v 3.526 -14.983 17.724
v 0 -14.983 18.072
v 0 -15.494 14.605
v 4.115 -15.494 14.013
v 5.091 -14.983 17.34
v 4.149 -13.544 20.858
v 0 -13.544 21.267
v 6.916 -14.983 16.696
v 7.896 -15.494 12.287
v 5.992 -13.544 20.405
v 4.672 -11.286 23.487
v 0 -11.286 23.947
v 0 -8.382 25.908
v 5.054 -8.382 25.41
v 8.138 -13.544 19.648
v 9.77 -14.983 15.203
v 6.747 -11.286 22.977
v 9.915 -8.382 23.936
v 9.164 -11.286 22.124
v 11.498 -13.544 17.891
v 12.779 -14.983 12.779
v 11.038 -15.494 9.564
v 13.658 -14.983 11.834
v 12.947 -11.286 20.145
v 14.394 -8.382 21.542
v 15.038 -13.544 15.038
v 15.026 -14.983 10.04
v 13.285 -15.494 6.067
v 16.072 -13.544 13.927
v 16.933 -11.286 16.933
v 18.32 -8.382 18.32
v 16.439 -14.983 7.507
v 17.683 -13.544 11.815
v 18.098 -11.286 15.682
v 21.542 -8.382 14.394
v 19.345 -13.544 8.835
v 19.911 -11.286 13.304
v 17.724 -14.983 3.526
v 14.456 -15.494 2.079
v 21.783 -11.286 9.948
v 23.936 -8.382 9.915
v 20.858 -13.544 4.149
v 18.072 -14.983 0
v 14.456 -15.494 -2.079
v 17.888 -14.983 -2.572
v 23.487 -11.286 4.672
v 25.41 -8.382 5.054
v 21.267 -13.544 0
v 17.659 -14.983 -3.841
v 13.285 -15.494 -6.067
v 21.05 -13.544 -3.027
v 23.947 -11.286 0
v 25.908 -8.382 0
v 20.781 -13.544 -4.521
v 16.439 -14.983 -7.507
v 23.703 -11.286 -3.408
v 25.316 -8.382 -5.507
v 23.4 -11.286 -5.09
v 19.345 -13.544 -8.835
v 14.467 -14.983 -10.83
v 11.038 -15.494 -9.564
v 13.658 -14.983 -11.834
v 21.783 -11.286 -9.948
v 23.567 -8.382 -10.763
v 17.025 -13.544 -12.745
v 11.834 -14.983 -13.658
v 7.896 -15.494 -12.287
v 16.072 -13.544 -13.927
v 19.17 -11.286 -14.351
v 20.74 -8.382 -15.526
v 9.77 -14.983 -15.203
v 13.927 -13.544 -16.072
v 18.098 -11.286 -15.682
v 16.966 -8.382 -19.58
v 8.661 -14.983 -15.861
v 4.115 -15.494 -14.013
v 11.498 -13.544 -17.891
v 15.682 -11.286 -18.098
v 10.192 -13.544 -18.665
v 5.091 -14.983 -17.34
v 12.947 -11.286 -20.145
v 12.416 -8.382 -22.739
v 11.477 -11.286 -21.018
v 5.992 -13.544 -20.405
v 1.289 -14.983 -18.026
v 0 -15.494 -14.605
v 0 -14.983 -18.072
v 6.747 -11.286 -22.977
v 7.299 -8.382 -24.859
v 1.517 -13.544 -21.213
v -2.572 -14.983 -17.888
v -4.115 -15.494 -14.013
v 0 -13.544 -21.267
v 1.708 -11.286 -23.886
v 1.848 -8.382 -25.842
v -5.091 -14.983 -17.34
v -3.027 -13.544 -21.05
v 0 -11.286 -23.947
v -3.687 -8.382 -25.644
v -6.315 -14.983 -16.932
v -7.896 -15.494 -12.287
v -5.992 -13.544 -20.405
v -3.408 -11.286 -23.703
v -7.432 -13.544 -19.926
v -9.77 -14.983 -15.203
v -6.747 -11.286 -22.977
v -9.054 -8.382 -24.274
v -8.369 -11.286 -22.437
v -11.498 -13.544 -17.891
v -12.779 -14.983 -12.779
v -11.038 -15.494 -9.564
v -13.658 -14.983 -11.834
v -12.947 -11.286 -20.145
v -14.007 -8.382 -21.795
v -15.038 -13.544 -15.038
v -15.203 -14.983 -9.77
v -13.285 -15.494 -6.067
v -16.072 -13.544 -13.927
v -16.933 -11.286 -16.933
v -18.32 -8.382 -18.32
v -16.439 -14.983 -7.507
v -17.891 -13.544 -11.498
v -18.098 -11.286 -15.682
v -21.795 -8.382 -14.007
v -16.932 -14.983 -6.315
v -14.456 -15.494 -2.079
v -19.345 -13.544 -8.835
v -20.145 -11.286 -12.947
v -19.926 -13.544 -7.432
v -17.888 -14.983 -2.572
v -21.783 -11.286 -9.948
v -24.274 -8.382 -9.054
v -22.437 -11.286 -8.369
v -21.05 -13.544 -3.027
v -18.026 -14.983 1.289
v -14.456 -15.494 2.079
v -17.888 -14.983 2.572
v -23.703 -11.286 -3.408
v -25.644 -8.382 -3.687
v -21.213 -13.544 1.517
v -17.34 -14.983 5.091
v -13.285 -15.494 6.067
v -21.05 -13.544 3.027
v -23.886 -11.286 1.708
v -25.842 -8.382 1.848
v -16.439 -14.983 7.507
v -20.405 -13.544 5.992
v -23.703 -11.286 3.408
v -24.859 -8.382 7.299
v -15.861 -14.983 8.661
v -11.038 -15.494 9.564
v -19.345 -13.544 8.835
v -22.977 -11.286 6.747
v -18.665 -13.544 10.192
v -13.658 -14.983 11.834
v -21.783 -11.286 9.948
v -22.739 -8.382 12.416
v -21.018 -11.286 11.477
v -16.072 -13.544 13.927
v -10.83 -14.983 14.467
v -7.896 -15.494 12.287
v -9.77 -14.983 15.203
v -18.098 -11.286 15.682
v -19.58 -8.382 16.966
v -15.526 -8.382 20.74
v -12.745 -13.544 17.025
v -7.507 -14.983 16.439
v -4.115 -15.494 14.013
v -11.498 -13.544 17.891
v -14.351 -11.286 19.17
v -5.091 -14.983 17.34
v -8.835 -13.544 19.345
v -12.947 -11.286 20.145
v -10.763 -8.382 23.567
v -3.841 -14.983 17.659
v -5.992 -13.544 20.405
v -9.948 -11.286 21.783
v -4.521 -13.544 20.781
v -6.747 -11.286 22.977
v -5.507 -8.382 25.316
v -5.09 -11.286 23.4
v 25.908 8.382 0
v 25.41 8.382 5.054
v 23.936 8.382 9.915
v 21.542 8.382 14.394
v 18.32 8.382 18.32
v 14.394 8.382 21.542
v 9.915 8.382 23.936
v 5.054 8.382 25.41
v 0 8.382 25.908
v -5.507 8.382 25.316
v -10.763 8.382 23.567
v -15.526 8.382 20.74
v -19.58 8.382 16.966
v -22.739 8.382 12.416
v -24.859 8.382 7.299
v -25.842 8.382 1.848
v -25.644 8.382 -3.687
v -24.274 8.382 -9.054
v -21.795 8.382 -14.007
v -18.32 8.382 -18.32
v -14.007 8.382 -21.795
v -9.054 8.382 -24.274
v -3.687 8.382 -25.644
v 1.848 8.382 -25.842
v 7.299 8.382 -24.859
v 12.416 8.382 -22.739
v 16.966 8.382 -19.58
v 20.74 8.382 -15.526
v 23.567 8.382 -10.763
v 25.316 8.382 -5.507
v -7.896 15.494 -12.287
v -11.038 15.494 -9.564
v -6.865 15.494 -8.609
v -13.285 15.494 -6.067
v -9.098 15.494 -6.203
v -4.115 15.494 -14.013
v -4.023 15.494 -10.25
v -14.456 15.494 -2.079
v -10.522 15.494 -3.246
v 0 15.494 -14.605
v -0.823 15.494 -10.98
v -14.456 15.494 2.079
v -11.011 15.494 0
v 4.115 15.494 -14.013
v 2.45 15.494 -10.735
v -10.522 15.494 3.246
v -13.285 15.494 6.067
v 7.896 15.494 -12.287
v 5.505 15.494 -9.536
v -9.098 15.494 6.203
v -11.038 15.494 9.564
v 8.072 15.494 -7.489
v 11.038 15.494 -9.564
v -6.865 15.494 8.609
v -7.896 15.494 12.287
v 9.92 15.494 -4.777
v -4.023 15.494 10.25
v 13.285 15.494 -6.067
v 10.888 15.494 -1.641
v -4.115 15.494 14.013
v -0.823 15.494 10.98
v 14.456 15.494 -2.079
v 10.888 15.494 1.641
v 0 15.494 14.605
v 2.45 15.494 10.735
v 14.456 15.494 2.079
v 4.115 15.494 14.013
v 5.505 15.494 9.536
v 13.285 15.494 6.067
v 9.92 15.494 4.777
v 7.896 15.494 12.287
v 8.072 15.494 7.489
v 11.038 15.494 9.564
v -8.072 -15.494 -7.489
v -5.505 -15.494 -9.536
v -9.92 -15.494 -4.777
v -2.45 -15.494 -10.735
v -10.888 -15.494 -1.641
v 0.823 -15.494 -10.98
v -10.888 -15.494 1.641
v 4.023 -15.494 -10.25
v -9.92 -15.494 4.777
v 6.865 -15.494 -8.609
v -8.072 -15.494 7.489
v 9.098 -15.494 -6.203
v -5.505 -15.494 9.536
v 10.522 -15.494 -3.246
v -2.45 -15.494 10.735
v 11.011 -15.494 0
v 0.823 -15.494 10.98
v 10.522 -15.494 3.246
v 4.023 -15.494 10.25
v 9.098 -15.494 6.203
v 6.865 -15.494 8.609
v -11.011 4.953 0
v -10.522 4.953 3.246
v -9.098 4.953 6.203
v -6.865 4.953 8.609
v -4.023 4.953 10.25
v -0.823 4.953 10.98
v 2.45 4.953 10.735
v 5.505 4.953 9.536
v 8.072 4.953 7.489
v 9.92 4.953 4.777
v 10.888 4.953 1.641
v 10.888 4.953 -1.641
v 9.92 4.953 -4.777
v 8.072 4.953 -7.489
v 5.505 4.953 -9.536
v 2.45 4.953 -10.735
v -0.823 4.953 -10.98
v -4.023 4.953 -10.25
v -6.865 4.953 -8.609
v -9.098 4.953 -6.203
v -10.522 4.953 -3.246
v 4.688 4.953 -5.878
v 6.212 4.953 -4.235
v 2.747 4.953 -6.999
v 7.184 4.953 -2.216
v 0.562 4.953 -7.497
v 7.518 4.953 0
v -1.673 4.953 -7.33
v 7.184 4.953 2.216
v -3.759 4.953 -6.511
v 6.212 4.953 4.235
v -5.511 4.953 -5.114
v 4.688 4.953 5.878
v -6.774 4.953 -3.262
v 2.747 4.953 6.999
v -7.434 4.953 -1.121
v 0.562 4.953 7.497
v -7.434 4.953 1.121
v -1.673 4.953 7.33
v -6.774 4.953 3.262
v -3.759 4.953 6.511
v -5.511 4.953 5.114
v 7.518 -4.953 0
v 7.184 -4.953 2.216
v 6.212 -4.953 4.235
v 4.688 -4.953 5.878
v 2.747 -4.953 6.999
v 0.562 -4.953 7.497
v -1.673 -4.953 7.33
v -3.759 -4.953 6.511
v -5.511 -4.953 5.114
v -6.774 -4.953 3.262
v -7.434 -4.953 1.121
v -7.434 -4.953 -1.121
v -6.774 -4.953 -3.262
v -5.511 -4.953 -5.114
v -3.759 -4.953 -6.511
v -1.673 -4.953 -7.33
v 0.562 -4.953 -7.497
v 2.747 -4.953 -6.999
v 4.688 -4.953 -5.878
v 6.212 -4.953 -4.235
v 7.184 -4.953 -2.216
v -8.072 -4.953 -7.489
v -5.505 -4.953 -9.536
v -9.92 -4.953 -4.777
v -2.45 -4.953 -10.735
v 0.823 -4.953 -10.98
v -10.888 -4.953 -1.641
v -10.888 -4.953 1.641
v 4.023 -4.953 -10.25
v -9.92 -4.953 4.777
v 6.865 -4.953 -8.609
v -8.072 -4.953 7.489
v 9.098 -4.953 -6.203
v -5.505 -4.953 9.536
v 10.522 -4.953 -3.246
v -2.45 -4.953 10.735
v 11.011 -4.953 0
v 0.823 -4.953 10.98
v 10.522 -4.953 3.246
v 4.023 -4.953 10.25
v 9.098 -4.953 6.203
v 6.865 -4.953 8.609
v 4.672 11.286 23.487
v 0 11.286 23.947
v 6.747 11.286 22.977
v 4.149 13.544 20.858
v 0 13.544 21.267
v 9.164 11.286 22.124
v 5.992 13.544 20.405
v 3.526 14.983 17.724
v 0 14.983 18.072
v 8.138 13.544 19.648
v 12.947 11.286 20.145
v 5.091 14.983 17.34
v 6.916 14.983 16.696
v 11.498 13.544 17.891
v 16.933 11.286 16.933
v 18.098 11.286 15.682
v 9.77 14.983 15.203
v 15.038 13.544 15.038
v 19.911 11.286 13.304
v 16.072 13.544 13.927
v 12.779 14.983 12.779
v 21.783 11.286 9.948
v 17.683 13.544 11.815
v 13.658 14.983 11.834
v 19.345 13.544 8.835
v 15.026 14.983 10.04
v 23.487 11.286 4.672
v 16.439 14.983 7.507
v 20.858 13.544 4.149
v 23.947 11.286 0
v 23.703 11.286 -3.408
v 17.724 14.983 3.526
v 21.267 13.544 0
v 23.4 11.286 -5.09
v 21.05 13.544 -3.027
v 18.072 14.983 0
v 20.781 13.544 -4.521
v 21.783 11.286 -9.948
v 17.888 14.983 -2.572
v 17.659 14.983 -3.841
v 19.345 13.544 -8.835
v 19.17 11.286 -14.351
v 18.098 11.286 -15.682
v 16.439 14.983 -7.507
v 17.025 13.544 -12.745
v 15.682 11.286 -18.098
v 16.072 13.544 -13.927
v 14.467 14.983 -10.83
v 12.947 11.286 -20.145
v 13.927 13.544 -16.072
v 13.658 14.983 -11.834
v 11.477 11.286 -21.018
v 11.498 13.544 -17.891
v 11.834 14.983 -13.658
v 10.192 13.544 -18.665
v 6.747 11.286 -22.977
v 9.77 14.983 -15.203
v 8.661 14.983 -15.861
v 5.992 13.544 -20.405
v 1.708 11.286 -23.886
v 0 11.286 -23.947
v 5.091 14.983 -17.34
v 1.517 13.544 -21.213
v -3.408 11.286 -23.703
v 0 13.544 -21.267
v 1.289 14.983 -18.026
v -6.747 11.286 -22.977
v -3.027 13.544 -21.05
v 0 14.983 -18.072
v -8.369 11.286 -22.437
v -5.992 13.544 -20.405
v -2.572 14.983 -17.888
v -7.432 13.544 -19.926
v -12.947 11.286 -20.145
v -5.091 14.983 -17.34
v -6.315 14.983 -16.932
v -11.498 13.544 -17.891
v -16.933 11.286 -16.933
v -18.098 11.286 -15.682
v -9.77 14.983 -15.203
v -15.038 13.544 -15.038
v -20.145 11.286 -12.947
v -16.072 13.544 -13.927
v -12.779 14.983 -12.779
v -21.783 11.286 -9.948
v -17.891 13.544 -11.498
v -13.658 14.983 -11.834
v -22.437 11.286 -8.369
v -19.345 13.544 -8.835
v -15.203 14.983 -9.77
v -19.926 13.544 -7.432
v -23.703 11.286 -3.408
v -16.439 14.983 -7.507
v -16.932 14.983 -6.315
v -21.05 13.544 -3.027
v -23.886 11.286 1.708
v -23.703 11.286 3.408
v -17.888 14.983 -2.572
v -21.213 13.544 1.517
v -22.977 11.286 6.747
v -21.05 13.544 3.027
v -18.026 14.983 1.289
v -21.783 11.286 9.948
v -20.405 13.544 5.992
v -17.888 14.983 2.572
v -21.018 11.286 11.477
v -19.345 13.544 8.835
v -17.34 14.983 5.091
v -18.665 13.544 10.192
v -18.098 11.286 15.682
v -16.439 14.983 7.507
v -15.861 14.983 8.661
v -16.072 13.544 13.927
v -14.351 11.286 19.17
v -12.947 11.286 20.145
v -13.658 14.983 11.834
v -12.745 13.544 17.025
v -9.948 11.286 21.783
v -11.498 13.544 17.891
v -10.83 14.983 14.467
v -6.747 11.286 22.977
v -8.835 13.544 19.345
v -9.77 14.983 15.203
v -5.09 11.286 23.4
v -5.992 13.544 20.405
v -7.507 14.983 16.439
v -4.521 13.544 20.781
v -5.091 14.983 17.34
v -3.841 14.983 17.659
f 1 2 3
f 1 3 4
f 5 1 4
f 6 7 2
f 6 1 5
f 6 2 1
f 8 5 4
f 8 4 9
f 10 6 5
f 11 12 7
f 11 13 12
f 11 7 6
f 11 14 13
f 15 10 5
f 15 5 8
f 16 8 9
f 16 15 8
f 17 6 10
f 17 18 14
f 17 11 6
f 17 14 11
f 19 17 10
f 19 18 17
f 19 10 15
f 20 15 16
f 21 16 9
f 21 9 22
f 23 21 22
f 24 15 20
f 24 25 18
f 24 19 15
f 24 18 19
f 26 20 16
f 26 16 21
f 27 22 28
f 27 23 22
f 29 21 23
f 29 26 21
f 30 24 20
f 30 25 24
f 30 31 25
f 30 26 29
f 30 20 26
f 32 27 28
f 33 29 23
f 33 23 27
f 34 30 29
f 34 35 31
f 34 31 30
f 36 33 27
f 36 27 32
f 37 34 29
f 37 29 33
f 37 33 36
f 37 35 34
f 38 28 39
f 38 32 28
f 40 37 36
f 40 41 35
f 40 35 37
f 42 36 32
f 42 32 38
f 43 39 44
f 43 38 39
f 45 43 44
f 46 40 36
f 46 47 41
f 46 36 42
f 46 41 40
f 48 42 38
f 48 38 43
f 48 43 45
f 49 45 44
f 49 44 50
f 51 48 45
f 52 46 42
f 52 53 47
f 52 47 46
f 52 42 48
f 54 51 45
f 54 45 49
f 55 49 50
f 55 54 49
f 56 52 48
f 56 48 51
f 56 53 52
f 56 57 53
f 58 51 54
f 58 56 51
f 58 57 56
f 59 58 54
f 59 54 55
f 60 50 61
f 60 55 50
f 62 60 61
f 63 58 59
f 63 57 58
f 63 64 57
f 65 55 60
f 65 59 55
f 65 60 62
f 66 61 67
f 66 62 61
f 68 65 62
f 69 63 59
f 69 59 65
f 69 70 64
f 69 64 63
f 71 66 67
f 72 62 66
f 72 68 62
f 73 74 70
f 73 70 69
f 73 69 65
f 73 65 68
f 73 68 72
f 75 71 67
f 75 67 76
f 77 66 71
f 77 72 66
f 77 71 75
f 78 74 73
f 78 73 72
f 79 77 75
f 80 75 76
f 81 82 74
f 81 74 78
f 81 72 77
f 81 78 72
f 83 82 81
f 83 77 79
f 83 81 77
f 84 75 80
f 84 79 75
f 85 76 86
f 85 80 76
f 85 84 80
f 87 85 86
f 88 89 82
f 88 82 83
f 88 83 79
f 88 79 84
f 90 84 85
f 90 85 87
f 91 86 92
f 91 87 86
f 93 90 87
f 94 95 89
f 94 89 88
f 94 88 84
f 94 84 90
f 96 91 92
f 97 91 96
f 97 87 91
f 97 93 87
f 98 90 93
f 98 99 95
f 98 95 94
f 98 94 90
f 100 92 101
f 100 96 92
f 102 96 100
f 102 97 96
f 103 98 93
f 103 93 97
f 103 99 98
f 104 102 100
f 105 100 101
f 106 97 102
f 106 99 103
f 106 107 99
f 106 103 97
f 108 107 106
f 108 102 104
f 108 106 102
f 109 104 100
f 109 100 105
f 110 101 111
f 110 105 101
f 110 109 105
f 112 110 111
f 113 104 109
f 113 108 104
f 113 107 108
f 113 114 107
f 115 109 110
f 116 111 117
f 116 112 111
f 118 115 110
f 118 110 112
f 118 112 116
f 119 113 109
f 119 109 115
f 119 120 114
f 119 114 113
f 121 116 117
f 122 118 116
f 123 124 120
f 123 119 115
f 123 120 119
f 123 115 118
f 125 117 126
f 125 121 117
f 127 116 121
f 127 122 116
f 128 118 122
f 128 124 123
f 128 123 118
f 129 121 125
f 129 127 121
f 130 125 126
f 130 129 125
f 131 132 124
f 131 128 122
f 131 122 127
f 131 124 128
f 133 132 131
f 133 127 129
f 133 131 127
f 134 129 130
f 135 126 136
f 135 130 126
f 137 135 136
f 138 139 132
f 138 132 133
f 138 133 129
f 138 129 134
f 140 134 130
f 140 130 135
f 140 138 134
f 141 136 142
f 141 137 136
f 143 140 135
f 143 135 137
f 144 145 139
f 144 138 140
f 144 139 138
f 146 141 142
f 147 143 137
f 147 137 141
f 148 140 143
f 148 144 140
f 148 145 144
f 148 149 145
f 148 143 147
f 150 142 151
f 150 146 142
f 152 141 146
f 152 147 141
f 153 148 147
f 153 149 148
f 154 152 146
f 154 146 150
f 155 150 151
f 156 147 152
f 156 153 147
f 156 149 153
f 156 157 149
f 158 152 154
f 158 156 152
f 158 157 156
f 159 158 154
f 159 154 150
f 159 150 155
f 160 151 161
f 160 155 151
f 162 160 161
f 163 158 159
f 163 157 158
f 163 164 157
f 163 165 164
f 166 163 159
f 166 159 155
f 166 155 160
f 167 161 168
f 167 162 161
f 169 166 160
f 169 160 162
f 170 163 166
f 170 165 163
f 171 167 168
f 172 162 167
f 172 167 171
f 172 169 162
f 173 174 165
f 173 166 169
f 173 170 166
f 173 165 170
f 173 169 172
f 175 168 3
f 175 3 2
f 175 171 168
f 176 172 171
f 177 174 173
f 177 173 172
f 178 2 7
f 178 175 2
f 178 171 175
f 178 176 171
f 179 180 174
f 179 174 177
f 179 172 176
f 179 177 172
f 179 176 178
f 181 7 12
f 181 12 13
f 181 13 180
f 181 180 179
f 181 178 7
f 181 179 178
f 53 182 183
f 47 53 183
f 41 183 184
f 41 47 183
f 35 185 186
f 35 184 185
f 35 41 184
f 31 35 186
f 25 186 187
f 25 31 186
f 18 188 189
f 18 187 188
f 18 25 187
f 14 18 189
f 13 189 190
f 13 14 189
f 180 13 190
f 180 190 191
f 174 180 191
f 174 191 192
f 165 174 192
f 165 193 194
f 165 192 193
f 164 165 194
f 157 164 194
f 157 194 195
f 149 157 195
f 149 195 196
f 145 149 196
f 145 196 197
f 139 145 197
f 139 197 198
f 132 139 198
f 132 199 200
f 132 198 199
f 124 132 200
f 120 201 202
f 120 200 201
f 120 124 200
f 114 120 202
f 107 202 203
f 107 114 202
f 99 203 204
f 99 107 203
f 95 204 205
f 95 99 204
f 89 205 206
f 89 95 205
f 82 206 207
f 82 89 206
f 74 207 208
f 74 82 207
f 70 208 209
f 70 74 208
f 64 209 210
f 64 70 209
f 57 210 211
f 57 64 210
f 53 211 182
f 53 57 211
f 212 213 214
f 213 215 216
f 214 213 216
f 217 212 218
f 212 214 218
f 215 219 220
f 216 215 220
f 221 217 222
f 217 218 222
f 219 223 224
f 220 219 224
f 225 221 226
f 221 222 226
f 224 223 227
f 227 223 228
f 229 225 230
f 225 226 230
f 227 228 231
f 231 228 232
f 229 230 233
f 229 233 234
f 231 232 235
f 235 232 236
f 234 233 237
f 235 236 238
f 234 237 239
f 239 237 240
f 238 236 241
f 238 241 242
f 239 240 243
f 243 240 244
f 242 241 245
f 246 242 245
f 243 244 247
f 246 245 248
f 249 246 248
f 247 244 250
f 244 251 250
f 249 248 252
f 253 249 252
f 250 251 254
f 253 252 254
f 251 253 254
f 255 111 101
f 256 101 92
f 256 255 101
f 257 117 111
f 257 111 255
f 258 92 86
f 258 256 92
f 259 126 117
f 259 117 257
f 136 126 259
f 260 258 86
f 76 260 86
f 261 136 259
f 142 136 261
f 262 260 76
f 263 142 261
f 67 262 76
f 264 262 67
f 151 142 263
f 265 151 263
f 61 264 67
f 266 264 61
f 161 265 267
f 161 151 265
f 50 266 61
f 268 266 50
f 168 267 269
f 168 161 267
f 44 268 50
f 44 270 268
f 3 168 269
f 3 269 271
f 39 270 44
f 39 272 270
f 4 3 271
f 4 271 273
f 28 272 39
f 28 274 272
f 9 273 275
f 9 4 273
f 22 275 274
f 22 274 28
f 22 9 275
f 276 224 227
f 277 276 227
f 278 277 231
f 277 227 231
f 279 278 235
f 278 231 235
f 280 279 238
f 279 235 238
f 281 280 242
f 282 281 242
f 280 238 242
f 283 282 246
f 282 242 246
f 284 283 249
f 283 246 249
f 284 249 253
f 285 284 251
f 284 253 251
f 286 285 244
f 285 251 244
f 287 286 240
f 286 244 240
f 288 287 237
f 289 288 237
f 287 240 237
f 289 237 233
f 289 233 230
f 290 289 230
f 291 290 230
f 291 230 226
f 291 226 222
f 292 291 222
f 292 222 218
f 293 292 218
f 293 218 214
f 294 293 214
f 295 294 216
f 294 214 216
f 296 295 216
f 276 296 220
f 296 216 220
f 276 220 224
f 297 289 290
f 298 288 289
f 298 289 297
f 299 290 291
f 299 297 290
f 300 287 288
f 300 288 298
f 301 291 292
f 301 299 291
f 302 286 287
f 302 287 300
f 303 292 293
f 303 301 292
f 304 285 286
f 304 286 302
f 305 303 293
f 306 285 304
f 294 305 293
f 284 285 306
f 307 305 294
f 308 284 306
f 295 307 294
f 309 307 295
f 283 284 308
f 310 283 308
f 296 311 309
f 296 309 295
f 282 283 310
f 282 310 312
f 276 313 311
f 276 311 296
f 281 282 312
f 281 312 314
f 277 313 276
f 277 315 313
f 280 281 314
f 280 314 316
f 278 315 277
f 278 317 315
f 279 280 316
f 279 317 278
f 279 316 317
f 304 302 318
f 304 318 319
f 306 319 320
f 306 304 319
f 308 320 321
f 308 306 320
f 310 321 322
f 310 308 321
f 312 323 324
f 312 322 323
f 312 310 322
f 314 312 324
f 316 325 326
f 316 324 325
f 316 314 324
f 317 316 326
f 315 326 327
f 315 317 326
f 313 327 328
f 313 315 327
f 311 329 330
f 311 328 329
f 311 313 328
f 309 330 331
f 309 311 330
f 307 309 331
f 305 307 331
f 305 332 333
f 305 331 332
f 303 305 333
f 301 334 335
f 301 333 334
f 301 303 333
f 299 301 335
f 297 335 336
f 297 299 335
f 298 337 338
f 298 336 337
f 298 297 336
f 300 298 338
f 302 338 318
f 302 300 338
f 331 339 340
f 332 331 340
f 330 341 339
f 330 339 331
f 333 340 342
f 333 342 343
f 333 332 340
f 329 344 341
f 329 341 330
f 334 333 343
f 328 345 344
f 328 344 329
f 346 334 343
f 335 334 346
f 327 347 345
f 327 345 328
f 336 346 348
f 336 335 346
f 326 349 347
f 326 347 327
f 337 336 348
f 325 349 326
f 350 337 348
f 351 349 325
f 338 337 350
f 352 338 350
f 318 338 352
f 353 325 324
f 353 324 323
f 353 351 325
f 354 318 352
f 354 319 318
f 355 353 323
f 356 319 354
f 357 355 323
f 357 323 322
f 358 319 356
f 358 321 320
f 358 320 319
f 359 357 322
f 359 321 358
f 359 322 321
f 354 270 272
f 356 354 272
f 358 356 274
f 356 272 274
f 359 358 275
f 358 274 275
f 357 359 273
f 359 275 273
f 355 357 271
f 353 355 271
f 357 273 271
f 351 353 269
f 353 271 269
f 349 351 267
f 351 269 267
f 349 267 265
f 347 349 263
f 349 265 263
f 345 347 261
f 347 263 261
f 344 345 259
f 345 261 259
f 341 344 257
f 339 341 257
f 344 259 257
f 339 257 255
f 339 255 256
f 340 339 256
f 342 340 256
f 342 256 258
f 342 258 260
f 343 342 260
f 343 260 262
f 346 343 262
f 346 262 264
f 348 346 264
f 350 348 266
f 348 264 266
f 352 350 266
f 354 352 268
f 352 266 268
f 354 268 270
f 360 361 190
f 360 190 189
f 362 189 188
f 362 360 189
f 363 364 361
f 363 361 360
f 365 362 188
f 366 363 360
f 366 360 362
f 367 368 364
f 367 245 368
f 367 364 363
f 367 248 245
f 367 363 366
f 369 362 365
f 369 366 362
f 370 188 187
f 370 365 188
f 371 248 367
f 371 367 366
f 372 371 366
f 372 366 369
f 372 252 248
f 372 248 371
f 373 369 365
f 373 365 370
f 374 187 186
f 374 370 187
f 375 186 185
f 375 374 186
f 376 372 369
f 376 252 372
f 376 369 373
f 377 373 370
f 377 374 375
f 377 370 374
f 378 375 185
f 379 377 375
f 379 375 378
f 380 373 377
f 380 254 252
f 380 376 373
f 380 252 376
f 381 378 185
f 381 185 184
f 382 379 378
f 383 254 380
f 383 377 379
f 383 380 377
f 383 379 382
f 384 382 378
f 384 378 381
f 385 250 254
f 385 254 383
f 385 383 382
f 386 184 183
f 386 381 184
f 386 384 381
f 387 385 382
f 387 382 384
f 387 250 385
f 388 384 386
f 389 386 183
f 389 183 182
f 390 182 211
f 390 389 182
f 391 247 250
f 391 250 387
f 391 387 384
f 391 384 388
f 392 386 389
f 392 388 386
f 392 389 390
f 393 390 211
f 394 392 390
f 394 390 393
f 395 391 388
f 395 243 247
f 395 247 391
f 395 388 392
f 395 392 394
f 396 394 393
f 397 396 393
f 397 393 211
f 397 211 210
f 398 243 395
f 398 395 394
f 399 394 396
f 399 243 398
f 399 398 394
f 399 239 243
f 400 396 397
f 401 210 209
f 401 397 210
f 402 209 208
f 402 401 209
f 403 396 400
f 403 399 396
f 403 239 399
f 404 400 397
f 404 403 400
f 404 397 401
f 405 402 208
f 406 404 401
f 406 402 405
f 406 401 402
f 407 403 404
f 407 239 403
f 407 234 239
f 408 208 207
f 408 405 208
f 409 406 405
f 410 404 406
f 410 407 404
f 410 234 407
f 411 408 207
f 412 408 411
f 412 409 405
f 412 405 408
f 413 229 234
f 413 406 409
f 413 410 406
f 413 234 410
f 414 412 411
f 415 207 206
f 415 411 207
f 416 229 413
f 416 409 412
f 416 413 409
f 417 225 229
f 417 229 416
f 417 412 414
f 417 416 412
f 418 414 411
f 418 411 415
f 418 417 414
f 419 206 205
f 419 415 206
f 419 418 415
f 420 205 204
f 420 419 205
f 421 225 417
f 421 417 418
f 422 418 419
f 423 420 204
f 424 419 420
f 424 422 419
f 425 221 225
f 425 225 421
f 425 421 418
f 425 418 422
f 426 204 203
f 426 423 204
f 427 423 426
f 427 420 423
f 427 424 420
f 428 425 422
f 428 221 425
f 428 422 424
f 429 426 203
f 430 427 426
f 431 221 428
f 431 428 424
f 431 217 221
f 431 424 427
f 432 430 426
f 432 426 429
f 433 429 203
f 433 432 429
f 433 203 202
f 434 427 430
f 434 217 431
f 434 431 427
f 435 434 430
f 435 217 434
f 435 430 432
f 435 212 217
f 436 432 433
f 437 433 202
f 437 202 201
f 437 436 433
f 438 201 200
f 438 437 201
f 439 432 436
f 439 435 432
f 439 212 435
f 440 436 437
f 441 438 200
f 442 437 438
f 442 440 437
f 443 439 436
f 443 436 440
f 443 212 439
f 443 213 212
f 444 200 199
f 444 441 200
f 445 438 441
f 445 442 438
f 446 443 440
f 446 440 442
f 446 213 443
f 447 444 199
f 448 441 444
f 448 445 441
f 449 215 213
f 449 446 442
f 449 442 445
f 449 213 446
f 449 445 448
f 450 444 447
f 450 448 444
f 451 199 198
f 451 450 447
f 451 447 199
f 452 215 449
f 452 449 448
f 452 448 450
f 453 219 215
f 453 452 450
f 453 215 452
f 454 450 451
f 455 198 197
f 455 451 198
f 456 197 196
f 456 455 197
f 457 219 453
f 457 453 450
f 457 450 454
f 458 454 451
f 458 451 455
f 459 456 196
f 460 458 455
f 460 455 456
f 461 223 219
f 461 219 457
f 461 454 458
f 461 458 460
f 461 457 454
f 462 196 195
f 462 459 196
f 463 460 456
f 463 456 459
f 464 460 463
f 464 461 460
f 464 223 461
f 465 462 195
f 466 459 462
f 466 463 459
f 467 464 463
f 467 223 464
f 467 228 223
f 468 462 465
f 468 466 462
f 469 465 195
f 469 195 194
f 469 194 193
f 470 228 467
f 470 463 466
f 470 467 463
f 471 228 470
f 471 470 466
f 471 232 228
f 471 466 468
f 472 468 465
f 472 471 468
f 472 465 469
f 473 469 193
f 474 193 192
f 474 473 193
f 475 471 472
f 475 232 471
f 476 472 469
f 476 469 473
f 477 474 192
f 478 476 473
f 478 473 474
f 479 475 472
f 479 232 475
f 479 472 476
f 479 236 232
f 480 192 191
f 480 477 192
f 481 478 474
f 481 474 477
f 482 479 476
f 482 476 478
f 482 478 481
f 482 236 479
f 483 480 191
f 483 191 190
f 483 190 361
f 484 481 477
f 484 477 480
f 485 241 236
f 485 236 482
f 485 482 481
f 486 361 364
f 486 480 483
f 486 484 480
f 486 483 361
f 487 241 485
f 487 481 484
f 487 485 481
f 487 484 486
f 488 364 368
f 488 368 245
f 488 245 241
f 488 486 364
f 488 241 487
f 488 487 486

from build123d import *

# Parameters (mm, degrees)
F0_R     = 25.908
F0_R_2   = 7.5184
F1_DEPTH = 15.494
F2_R     = 11.0109
F3_DEPTH = 10.541
F4_R     = 11.0109
F5_DEPTH = 10.541


with BuildPart() as f1:
    # F0 (on Front) → F1 (new body, symmetric)
    with BuildSketch(Plane.XZ):
        Circle(F0_R)
        Circle(F0_R_2, mode=Mode.SUBTRACT)
    extrude(amount=F1_DEPTH, both=True)

    # F2 (on face) → F3 (cut)
    with BuildSketch(Plane.XZ.offset(15.494)):
        Circle(F2_R)
    extrude(amount=-F3_DEPTH, mode=Mode.SUBTRACT)

    # F4 (on face) → F5 (cut)
    with BuildSketch(Plane(origin=(0, 15.494, 0), x_dir=(-1, 0, 0), z_dir=(0, 1, 0))):
        Circle(F4_R)
    extrude(amount=-F5_DEPTH, mode=Mode.SUBTRACT)

    # F6 (on Right) → F7 (revolve, cut)
    with BuildSketch(Plane.YZ):
        with BuildLine():
            Line((-15.494, 14.4014569813), (-15.494, 14.605))
            ThreePointArc((-15.494, 14.605), (-15.4944077798, 14.5032284906), (-15.494, 14.4014569813))
        make_face()
        with BuildLine():
            ThreePointArc((15.494, 14.4014569813), (15.4944077798, 14.5032284906), (15.494, 14.605))
            Line((15.494, 14.605), (15.494, 14.4014569813))
        make_face()
        with BuildLine():
            Line((-8.382, 25.908), (8.382, 25.908))
            ThreePointArc((8.382, 25.908), (4.2751259826, 27.1166131912), (0, 26.8919848915))
            ThreePointArc((0, 26.8919848915), (-4.2751259826, 27.1166131912), (-8.382, 25.908))
        make_face()
        with BuildLine():
            ThreePointArc((0, 26.8919848915), (4.2751259826, 27.1166131912), (8.382, 25.908))
            ThreePointArc((8.382, 25.908), (13.5435812801, 21.2667533897), (15.494, 14.605))
            Line((15.494, 14.605), (15.494, 30.48))
            Line((15.494, 30.48), (-15.494, 30.48))
            Line((-15.494, 30.48), (-15.494, 14.605))
            ThreePointArc((-15.494, 14.605), (-13.5435812801, 21.2667533897), (-8.382, 25.908))
            ThreePointArc((-8.382, 25.908), (-4.2751259826, 27.1166131912), (0, 26.8919848915))
        make_face()
    revolve(axis=Axis((0, -4.953, 0), (0, 1, 0)), mode=Mode.SUBTRACT)


solid = f1.part
